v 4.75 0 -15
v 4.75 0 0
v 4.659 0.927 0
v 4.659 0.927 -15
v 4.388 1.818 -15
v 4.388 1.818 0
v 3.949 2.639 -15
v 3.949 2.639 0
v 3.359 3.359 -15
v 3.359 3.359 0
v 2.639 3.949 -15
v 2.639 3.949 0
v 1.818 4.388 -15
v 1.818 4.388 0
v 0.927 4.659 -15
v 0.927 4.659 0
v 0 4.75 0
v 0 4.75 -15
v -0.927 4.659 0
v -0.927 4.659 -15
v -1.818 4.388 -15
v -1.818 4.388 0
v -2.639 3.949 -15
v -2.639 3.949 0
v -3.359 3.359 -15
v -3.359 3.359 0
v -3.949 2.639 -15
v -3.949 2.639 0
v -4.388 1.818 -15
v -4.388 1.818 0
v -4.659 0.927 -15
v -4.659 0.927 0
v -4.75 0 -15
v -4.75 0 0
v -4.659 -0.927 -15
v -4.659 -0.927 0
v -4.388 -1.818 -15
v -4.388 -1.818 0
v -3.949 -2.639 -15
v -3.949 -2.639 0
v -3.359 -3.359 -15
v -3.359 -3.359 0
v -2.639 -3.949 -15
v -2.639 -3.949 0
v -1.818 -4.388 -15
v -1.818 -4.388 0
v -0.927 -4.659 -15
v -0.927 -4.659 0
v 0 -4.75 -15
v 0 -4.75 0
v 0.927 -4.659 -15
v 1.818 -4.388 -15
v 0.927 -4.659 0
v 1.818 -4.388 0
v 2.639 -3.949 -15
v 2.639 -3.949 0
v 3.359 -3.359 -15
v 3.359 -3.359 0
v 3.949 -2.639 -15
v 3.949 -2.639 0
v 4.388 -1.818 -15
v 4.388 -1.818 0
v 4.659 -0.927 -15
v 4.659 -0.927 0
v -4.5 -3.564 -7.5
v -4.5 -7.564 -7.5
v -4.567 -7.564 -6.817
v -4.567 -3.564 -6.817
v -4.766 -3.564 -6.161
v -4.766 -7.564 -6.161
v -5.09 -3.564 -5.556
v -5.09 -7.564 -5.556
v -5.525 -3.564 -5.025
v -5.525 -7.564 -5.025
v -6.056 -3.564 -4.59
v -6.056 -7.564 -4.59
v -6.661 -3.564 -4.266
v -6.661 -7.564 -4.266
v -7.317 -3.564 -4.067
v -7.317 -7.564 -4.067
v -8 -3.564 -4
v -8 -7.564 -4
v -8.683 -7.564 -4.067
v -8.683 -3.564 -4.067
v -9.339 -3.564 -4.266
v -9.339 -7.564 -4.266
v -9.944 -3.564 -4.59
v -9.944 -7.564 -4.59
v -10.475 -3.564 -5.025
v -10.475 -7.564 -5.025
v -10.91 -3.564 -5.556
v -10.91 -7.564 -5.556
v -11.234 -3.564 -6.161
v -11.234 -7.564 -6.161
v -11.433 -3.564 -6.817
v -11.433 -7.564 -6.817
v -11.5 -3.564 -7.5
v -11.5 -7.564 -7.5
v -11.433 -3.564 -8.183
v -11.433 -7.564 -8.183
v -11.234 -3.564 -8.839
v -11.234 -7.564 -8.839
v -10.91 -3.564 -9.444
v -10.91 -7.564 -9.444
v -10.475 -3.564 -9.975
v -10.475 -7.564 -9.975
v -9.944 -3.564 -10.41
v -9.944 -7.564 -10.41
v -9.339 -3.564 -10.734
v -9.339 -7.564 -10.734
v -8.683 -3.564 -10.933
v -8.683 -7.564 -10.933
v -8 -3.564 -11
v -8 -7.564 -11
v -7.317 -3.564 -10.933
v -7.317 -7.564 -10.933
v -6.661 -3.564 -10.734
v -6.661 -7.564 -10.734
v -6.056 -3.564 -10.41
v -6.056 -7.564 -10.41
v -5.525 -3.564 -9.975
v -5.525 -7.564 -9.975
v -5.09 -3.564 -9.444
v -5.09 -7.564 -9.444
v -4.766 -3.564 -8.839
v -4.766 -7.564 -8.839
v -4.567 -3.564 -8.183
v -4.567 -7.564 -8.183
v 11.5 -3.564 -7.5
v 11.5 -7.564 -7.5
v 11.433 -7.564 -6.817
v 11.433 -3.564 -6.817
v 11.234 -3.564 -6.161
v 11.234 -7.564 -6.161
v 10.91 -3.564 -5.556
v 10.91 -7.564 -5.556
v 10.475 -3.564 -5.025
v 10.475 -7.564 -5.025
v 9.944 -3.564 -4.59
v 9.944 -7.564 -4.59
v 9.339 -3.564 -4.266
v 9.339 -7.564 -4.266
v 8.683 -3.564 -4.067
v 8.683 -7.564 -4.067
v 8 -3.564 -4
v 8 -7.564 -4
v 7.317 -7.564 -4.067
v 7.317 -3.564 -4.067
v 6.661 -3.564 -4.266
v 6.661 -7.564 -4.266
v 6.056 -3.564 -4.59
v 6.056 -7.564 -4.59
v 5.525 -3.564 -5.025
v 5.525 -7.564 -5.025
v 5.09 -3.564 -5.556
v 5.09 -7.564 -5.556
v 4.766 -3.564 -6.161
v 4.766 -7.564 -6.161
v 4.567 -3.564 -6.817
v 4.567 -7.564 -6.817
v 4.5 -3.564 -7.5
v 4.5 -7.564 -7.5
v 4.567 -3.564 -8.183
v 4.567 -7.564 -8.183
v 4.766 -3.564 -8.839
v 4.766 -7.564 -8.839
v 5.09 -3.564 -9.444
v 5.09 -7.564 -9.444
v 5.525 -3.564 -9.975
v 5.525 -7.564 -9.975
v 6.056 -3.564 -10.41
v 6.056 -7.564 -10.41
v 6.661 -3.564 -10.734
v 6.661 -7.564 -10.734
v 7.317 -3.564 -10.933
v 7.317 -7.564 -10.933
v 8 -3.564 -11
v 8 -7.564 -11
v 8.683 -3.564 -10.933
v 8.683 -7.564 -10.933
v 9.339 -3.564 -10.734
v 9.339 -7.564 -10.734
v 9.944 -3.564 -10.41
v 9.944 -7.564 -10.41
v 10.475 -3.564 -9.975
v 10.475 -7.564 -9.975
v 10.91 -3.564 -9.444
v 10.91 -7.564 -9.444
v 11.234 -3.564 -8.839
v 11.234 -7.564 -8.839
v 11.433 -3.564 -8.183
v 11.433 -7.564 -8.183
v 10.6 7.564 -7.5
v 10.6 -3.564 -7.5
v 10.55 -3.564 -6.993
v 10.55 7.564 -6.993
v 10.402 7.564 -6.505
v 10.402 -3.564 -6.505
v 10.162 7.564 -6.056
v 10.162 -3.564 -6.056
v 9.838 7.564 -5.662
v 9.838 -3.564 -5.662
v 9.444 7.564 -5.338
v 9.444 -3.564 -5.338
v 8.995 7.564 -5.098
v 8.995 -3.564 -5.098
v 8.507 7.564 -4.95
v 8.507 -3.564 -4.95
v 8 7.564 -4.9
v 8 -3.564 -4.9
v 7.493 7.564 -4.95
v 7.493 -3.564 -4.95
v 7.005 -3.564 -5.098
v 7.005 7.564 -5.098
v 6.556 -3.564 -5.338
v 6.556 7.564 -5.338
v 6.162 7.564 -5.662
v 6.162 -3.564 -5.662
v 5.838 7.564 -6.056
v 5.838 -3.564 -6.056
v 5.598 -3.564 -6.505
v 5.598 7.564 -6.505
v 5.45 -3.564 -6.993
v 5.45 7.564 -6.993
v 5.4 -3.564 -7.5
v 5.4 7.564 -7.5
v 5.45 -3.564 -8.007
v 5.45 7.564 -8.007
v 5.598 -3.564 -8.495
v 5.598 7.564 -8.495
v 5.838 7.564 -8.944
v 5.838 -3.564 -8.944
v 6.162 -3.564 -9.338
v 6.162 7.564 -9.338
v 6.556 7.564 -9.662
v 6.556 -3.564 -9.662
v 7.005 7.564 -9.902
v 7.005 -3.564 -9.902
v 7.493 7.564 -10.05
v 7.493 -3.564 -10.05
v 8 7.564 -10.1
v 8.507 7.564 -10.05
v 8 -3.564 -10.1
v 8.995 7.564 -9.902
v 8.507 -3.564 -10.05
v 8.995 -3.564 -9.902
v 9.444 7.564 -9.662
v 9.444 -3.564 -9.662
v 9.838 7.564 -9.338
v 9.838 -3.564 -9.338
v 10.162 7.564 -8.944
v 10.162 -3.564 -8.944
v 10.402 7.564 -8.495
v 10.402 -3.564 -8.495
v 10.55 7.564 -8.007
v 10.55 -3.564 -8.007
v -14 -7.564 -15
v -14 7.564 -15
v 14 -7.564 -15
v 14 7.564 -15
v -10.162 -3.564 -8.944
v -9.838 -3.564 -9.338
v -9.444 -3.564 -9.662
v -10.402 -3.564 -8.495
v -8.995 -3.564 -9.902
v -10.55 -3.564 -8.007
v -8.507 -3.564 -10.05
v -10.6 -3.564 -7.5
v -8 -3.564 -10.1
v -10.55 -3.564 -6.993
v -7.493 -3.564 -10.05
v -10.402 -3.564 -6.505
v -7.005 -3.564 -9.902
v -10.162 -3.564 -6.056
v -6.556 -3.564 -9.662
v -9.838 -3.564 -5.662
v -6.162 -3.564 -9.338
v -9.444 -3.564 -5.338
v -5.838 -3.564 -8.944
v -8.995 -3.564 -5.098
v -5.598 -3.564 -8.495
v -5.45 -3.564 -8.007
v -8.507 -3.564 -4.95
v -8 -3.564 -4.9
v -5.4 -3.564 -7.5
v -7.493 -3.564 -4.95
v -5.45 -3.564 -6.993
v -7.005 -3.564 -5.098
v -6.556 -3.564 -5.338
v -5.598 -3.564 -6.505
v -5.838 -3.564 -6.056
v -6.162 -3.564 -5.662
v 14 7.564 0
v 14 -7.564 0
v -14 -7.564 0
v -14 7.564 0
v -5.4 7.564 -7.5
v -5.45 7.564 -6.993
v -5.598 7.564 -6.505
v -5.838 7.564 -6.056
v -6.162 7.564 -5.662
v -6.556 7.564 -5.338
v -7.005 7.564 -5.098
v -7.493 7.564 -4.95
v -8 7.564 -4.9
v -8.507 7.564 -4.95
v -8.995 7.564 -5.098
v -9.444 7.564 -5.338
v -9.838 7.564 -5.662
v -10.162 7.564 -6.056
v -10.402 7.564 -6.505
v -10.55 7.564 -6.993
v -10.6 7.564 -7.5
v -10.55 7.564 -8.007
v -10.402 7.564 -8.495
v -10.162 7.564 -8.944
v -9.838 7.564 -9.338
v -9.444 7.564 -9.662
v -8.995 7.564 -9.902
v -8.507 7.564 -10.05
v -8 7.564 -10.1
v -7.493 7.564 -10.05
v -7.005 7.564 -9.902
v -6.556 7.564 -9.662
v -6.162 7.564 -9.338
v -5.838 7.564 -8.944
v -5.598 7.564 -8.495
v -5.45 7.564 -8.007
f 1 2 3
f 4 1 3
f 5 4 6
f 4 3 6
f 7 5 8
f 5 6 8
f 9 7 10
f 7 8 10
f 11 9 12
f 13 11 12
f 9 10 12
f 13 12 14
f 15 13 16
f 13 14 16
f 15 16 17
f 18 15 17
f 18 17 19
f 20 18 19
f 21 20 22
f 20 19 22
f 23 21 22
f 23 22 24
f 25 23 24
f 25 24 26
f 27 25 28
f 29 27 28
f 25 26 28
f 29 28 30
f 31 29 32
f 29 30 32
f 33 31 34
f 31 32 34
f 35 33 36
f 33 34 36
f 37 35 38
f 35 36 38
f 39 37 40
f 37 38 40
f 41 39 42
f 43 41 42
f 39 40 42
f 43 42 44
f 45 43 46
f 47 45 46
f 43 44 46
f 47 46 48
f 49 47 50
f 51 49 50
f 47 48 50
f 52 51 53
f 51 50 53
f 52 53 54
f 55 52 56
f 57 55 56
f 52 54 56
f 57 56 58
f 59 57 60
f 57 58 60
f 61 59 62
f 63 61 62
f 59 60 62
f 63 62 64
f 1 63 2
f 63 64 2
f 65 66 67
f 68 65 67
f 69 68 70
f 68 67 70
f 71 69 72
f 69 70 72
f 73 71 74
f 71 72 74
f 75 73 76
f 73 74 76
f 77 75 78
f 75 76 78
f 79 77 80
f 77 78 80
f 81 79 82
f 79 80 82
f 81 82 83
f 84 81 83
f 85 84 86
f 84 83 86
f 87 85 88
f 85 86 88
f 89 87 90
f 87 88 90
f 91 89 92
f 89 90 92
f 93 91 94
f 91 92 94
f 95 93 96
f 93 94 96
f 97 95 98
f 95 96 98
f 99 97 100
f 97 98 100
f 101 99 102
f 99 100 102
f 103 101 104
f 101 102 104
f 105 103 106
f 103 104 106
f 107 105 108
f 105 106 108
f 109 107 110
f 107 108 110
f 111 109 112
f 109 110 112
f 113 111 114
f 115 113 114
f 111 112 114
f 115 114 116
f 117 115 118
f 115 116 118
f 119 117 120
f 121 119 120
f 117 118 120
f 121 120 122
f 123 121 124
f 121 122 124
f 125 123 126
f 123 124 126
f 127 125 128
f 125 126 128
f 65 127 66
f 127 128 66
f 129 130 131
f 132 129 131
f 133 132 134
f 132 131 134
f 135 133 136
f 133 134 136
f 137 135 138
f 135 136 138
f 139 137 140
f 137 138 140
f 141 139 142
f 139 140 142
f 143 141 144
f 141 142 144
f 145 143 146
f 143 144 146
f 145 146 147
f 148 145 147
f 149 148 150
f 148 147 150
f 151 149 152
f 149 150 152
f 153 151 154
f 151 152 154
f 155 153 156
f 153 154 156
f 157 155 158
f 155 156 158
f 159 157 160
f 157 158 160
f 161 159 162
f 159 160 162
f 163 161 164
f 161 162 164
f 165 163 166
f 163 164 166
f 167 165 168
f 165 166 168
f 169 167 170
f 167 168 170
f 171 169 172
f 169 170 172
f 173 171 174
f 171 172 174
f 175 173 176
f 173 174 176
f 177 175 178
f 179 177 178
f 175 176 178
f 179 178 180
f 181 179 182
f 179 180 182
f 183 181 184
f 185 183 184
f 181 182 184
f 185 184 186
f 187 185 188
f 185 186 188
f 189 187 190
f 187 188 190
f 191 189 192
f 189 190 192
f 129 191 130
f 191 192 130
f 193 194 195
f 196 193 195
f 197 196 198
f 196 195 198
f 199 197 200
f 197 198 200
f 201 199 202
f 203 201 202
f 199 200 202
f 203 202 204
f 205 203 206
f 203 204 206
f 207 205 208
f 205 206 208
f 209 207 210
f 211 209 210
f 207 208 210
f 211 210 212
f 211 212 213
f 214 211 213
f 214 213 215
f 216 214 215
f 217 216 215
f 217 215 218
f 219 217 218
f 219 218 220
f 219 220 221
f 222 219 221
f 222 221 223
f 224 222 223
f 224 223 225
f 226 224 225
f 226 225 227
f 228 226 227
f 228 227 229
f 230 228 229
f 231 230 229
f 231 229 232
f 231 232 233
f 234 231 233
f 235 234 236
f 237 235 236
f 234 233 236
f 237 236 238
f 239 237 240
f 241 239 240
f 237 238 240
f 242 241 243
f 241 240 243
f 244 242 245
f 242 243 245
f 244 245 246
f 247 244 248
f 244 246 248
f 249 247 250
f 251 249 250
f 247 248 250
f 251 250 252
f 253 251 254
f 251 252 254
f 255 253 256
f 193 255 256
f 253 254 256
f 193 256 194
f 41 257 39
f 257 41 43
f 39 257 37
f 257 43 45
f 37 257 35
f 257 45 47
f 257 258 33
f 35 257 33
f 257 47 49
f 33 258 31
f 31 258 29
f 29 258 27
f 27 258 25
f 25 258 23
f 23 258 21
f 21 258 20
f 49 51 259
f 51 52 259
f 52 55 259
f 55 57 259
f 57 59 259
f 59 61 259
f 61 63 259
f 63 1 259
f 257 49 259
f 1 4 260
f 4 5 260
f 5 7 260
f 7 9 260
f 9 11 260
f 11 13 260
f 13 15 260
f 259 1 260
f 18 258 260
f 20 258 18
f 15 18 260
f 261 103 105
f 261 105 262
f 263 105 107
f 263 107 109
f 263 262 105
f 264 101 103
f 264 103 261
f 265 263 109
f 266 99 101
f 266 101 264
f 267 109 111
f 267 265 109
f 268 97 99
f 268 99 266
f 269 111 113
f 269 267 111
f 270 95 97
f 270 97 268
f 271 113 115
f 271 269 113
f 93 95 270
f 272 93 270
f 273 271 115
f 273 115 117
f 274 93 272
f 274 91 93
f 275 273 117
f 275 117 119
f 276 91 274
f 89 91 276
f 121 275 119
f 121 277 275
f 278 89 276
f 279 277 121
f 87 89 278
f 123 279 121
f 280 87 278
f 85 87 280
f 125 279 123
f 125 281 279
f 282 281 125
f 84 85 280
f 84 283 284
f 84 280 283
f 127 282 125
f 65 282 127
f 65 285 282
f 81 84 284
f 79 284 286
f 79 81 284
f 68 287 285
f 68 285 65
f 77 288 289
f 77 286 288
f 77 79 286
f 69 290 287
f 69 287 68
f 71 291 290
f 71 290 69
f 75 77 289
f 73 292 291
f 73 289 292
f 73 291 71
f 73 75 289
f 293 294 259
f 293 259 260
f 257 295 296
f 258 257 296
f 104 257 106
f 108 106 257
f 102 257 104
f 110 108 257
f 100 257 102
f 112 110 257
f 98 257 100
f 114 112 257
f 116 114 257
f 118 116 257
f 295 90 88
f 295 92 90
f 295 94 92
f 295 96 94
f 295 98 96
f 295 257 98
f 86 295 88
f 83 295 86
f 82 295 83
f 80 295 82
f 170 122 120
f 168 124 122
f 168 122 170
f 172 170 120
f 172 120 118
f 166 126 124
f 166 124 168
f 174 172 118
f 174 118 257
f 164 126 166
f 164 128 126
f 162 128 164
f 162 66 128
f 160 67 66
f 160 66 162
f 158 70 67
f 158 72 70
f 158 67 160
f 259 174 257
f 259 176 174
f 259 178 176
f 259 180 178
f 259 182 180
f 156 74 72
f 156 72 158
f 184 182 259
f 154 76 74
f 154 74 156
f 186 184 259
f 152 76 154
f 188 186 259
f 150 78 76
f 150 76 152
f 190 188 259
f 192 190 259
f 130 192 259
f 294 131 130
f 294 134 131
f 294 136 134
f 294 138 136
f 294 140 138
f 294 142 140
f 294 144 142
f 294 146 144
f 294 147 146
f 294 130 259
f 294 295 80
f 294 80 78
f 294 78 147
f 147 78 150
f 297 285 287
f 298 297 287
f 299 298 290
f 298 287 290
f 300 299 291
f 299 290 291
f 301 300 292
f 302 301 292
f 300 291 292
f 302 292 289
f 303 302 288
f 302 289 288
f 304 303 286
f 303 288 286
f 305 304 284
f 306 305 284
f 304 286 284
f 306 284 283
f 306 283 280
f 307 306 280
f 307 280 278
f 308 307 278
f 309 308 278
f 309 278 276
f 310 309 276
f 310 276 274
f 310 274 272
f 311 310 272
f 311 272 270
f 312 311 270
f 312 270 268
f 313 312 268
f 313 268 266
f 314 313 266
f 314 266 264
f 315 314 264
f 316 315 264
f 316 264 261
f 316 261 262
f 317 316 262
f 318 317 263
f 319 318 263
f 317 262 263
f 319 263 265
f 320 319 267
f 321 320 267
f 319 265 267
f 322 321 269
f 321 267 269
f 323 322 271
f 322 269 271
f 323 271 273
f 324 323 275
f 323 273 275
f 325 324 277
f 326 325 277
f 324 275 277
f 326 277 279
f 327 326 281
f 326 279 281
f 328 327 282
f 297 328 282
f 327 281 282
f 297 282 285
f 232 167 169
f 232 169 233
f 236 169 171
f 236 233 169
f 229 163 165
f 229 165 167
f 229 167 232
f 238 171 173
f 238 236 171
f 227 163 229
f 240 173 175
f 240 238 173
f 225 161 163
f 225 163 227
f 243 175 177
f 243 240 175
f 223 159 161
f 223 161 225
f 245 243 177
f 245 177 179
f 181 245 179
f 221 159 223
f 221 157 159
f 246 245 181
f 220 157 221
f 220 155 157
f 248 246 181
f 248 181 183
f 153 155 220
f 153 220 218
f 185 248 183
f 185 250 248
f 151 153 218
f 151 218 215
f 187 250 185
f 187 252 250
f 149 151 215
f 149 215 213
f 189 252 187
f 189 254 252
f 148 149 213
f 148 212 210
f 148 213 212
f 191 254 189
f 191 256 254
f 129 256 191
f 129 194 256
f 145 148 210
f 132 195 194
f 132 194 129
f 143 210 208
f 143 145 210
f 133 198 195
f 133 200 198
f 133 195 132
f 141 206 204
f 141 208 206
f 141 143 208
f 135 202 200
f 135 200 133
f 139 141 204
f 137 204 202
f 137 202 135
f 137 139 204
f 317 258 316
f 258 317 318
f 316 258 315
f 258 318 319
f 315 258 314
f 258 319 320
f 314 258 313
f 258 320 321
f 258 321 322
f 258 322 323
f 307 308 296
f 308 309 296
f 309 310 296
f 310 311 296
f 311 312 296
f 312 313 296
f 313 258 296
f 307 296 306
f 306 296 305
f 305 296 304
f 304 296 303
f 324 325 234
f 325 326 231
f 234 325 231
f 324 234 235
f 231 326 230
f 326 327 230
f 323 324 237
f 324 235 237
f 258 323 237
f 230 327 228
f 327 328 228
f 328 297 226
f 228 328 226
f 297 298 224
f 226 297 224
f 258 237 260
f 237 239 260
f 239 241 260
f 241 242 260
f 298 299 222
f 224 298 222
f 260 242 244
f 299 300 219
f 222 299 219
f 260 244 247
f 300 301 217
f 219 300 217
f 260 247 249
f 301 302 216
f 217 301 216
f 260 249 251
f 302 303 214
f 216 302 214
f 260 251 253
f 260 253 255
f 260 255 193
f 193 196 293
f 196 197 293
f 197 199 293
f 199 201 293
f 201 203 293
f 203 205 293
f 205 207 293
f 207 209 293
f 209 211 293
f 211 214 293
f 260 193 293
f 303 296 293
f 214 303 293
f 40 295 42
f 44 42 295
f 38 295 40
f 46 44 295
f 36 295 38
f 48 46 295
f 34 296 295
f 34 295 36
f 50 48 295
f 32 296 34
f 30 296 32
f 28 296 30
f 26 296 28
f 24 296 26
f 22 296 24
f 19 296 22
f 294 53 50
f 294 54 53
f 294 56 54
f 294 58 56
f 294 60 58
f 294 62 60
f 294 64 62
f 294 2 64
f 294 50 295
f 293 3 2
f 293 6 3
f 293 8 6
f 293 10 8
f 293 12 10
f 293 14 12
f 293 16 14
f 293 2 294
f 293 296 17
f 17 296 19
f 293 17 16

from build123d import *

# Parameters (mm, degrees)
F0_W     = 28
F0_H     = 15.127502
F0_R     = 4.75
F1_DEPTH = 15
F2_R     = 2.6
F3_DEPTH = 25
F2_R_2   = 3.5
F4_DEPTH = 4


with BuildPart() as f1:
    # F0 (on Top) → F1 (new body)
    with BuildSketch(Plane.XY):
        Rectangle(F0_W, F0_H)
        Circle(F0_R, mode=Mode.SUBTRACT)
    extrude(amount=-F1_DEPTH)

    # F2 (on face) → F3 (cut)
    with BuildSketch(Plane.XZ.offset(7.563751)):
        with Locations((-8, -7.5)):
            Circle(F2_R)
        with Locations((8, -7.5)):
            Circle(F2_R)
    extrude(amount=-F3_DEPTH, mode=Mode.SUBTRACT)

    # F2 (on face) → F4 (cut)
    with BuildSketch(Plane.XZ.offset(7.563751)):
        with Locations((-8, -7.5)):
            Circle(F2_R_2)
        with Locations((-8, -7.5)):
            Circle(F2_R, mode=Mode.SUBTRACT)
        with Locations((8, -7.5)):
            Circle(F2_R_2)
        with Locations((8, -7.5)):
            Circle(F2_R, mode=Mode.SUBTRACT)
    extrude(amount=-F4_DEPTH, mode=Mode.SUBTRACT)


solid = f1.part
